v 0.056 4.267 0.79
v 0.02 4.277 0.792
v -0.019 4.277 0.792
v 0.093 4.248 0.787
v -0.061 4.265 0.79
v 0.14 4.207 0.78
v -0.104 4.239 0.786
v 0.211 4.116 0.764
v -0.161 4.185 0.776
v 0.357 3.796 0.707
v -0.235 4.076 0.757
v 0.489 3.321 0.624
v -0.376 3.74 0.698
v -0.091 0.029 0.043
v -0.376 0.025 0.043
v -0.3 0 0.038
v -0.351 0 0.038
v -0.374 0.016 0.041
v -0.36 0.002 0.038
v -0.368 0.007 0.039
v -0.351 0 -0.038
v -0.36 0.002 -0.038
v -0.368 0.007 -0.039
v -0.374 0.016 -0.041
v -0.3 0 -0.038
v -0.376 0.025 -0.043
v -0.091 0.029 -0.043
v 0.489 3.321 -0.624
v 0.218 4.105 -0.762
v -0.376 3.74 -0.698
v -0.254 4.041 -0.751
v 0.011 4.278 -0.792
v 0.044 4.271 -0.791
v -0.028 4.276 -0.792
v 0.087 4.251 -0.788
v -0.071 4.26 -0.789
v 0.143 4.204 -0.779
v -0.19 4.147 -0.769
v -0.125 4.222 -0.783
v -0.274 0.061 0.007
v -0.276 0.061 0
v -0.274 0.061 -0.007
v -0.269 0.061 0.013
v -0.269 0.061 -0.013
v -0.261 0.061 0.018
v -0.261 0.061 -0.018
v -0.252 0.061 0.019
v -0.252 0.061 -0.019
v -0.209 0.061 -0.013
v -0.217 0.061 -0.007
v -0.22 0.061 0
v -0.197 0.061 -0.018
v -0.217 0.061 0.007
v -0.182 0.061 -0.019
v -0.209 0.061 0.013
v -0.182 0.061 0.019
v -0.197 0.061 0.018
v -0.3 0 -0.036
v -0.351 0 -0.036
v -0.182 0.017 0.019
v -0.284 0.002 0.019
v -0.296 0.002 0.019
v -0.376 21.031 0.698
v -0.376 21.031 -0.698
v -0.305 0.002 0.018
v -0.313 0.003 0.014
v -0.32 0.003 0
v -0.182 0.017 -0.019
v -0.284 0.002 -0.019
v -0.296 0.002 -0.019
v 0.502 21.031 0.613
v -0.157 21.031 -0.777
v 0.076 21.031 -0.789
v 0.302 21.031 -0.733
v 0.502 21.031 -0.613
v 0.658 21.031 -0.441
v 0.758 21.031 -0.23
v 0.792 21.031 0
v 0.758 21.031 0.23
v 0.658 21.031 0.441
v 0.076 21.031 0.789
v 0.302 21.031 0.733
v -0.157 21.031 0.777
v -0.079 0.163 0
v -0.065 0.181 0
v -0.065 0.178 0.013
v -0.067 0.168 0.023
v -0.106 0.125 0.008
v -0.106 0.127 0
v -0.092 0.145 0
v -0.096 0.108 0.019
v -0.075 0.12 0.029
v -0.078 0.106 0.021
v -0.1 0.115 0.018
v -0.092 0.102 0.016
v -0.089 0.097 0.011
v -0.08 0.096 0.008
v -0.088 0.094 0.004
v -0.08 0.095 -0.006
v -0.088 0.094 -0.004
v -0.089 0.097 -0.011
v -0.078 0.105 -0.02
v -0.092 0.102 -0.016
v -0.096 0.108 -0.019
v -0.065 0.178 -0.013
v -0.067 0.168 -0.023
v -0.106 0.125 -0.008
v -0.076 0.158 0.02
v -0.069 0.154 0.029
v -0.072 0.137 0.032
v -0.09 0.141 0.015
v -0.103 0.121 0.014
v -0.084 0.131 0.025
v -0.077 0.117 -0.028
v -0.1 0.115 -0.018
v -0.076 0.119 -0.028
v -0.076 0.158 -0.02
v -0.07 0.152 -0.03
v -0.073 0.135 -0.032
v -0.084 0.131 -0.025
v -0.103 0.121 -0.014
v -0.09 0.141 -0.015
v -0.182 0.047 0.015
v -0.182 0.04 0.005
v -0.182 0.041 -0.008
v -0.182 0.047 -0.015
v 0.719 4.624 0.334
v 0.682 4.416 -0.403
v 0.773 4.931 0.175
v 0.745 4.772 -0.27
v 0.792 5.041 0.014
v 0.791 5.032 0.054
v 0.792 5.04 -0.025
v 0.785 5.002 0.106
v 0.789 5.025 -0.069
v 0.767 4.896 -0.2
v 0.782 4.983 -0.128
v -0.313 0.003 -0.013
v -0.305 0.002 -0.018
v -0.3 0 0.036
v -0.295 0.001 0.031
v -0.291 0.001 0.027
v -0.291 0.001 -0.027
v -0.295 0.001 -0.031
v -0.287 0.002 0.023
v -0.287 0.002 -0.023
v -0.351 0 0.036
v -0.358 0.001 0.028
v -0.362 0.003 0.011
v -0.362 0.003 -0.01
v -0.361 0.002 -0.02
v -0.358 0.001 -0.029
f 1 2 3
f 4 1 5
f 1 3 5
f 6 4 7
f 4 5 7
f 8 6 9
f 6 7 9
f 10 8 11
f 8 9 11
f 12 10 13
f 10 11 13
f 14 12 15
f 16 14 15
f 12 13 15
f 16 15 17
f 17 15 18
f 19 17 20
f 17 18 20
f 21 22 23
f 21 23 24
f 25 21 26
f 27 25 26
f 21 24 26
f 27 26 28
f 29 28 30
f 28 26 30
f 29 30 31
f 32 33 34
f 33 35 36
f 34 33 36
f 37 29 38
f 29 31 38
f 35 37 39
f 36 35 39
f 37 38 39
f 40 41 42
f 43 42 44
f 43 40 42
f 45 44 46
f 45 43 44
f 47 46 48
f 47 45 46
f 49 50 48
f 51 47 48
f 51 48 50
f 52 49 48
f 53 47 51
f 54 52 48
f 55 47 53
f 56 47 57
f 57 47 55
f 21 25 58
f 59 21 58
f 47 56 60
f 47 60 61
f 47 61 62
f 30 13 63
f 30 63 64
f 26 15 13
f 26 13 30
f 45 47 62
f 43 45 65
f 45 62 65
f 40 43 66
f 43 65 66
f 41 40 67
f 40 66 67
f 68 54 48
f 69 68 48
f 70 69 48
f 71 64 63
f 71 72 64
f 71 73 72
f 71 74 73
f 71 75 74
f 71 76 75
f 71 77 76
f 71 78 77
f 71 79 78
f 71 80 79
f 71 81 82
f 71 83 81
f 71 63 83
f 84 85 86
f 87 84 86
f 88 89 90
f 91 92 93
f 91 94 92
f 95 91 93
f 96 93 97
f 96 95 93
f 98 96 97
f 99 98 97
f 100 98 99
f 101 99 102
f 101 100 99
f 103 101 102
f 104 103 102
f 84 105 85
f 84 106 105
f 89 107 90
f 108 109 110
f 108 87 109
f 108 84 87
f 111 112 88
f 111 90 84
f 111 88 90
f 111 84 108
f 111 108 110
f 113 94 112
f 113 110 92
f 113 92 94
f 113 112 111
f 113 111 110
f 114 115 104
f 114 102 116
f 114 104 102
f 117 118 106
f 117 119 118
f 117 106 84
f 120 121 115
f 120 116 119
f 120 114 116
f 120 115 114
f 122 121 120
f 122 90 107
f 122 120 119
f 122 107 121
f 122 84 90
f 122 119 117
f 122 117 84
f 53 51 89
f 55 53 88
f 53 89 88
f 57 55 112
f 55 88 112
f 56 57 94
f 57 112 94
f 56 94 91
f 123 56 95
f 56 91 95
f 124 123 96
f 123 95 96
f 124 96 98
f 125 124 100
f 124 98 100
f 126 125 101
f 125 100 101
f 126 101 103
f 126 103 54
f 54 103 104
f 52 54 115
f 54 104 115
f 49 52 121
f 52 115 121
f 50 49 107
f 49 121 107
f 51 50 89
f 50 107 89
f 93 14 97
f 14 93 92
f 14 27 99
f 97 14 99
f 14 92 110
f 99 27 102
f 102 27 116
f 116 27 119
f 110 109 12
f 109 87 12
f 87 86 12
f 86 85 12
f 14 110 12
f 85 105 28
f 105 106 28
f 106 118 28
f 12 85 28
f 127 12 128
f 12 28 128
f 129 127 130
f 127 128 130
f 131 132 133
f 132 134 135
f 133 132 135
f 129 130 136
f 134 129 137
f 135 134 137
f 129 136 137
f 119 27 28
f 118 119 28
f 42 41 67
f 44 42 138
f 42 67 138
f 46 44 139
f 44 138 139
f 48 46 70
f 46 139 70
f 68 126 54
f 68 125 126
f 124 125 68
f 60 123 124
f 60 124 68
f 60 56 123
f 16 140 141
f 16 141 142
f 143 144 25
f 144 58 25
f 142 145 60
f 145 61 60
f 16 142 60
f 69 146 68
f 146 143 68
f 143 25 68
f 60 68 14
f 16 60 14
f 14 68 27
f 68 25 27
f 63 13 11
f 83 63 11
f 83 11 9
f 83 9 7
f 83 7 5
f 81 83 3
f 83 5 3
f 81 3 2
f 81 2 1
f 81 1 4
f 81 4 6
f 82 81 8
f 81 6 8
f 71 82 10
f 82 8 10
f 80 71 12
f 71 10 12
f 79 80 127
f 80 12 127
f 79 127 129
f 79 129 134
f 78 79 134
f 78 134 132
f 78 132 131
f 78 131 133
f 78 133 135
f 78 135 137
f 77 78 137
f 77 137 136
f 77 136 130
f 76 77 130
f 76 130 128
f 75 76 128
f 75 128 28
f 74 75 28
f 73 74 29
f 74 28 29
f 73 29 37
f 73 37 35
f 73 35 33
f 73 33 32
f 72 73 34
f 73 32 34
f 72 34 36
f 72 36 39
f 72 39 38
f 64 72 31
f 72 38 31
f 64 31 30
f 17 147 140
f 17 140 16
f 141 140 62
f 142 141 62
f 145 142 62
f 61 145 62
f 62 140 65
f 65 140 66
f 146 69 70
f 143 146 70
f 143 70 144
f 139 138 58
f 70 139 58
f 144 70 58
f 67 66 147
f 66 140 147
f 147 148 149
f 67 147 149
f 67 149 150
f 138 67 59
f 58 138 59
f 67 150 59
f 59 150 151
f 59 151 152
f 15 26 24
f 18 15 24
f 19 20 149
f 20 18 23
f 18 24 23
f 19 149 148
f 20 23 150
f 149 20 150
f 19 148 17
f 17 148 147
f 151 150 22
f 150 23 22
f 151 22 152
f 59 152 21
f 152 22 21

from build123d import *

# Parameters (mm, degrees)
TD_SKETCH_R                             = 0.79248
TL_FEATURE_DEPTH                        = 21.0312
TDF_STD_SKETCH_W                        = 2.09296
TDF_STD_SKETCH_H                        = 2.09296
TDF_STD_FEATURE_DEPTH                   = 22.061040395
ISA_20_STD_FEATURE_DEPTH                = 22.061040395
ISA_20_STD_FEATURE_DEPTH_BACK           = 22.061040395
F_10BA_STD_FEATURE_DEPTH                = 22.061040395
F_10BA_STD_FEATURE_DEPTH_BACK           = 22.061040395
FRO_STD_FEATURE_DEPTH                   = 22.061040395
FRO_STD_FEATURE_DEPTH_BACK              = 22.061040395
C_STD_FEATURE_DEPTH                     = 22.061040395
C_STD_FEATURE_DEPTH_BACK                = 22.061040395
ERW_STD_FEATURE_DEPTH                   = 0.01905
H_STD_FEATURE_REACH                     = 22.955
H_STD_SKETCH_R                          = 0.01905
H_STD_SKETCH_3_R                        = 0.01905
FUNNEL_FINAL_DIAMETRE_STD_FEATURE_DEPTH = 2.499995
FUNNEL_FINAL_DIAMETRE_STD_FEATURE_DRAFT = -22.5
ROUND_BR_STD_FEATURE_START              = -1
ROUND_BR_STD_FEATURE_DEPTH              = 0.939082249


with BuildPart() as part:
    # TD_sketch → TL_feature (new body)
    with BuildSketch(Plane(origin=(0, 0, 0), x_dir=(1, 0, 0), z_dir=(0, 1, 0))):
        with Locations(Location((0, 0, 0), (0, 0, 270))):
            Circle(TD_SKETCH_R)
    extrude(amount=TL_FEATURE_DEPTH)

    # TDF_STD_sketch → TDF_STD_feature (cut, through all)
    with BuildSketch(Plane(origin=(0, 0, 0), x_dir=(1, 0, 0), z_dir=(0, 1, 0))):
        with Locations((-1.4224, 0)):
            Rectangle(TDF_STD_SKETCH_W, TDF_STD_SKETCH_H)
    extrude(amount=TDF_STD_FEATURE_DEPTH, mode=Mode.SUBTRACT)

    # ISA_20_STD_sketch → ISA_20_STD_feature (cut, two sides: drawn at the far end of the back side and taken through both)
    with BuildSketch(Plane(origin=(0, 0, 0), x_dir=(0, 0, -1), z_dir=(1, 0, 0)).offset(-ISA_20_STD_FEATURE_DEPTH_BACK)):
        Polygon((-12.955177728, 73.256388083), (-3.746467997, 21.0312), (-0.0381, 0), (0.0381, 0), (3.746467997, 21.0312), (12.955177728, 73.256388083), (12.955177728, -32.805303497), (-12.955177728, -32.805303497), align=None)
    extrude(amount=ISA_20_STD_FEATURE_DEPTH + ISA_20_STD_FEATURE_DEPTH_BACK, mode=Mode.SUBTRACT)

    # 10BA_STD_sketch → 10BA_STD_feature (cut, two sides: drawn at the far end of the back side and taken through both)
    with BuildSketch(Plane.XY.offset(-F_10BA_STD_FEATURE_DEPTH_BACK)):
        Polygon((-53.187771959, 0), (-0.37592, 0), (-0.29972, 0), (-0.091356515, 0.029283578), (3.611847997, 21.0312), (12.782529849, 73.04072126), (91.167207296, 2.243763904), (25.196905488, -70.796957355), align=None)
    extrude(amount=F_10BA_STD_FEATURE_DEPTH + F_10BA_STD_FEATURE_DEPTH_BACK, mode=Mode.SUBTRACT)

    # FRO_STD_sketch → FRO_STD_feature (cut, two sides: drawn at the far end of the back side and taken through both)
    with BuildSketch(Plane.XY.offset(-FRO_STD_FEATURE_DEPTH_BACK)):
        with BuildLine():
            Line((-0.37592, 52.149873762), (-0.37592, 0.0254))
            ThreePointArc((-0.37592, 0.0254), (-0.368480512, 0.007439488), (-0.35052, 0))
            Line((-0.35052, 0), (51.773953762, 0))
            Line((51.773953762, 0), (-21.941183964, -73.715137726))
            Line((-21.941183964, -73.715137726), (-74.091057726, -21.565263964))
            Line((-74.091057726, -21.565263964), (-0.37592, 52.149873762))
        make_face()
    extrude(amount=FRO_STD_FEATURE_DEPTH + FRO_STD_FEATURE_DEPTH_BACK, mode=Mode.SUBTRACT)

    # C_STD_sketch → C_STD_feature (cut, two sides: drawn at the far end of the back side and taken through both)
    with BuildSketch(Plane(origin=(0, 0, 0), x_dir=(0, 0, -1), z_dir=(1, 0, 0)).offset(-C_STD_FEATURE_DEPTH_BACK)):
        with BuildLine():
            Line((-51.36762506, -8.882670253), (-0.03551364, 0))
            ThreePointArc((-0.03551364, 0), (0, 0.003050032), (0.03551364, 0))
            Line((0.03551364, 0), (51.36762506, -8.882670253))
            Line((51.36762506, -8.882670253), (51.36762506, -113.072640858))
            Line((51.36762506, -113.072640858), (-51.36762506, -113.072640858))
            Line((-51.36762506, -113.072640858), (-51.36762506, -8.882670253))
        make_face()
    extrude(amount=C_STD_FEATURE_DEPTH + C_STD_FEATURE_DEPTH_BACK, mode=Mode.SUBTRACT)


with BuildPart() as body_2:
    # ERW_STD_sketch → ERW_STD_feature (new, symmetric)
    with BuildSketch(Plane.XY):
        Polygon((-0.182120032, 0.06096), (-0.182120032, 0), (-0.321820032, 0), (-0.275883377, 0.06096), align=None)
    extrude(amount=ERW_STD_FEATURE_DEPTH, both=True)

    # H_STD_sketch → H_STD_feature (add, up to next)
    with BuildSketch(Plane(origin=(-0.096909952, 0.110156063, 0), x_dir=(0, 0, -1), z_dir=(0.8660254037844415, 0.4999999999999953, 0)), mode=Mode.PRIVATE) as h_std_feature_sk1:
        with Locations(Location((0, 0, 0), (0, 0, 90))):
            Circle(H_STD_SKETCH_R)
    h_std_feature_tool1 = extrude(h_std_feature_sk1.sketch, amount=-H_STD_FEATURE_REACH, mode=Mode.PRIVATE) - body_2.part
    add(h_std_feature_tool1.solids().sort_by_distance((-0.09691, 0.110156, 0))[0])


with BuildPart() as funnel_final_diametre_std_feature_tool:
    # H_STD_sketch<3> → funnel_final_diametre_STD_feature (with draft: the straight prism first)
    with BuildSketch(Plane(origin=(-0.096909952, 0.110156063, 0), x_dir=(0, 0, -1), z_dir=(0.8660254037844415, 0.4999999999999953, 0))):
        with Locations(Location((0, 0, 0), (0, 0, 90))):
            Circle(H_STD_SKETCH_3_R)
    extrude(amount=FUNNEL_FINAL_DIAMETRE_STD_FEATURE_DEPTH)
    # funnel_final_diametre_STD_feature: the draft: its side faces are tilted about the plane it starts from
    funnel_final_diametre_std_feature_sides = [funnel_final_diametre_std_feature_tool.faces().sort_by_distance(p)[0] for p in [
        (0.995144638, 0.718657029, 0),
    ]]
    draft(funnel_final_diametre_std_feature_sides, Plane(origin=(-0.096909952, 0.110156063, 0), x_dir=(0, 0, -1), z_dir=(0.8660254037844415, 0.4999999999999953, 0)), FUNNEL_FINAL_DIAMETRE_STD_FEATURE_DRAFT)


with BuildPart() as body_2_1:
    add(body_2.part)

    # funnel_final_diametre_STD_feature: add funnel_final_diametre_std_feature_tool
    add(funnel_final_diametre_std_feature_tool.part)

    # ROUND_BR_STD_feature: read off the stored shape, not the designer's step
    # ROUND_BR_STD_feature outline → ROUND_BR_STD_feature (cut)
    with BuildSketch(Plane(origin=(0, 0, 0), x_dir=(0.79863551004729, -0.601815023152052, 0), z_dir=(0.601815023152052, 0.79863551004729, 0)).offset(ROUND_BR_STD_FEATURE_START)):
        with BuildLine():
            Line((-0.257016905, -0.01905), (-0.237966905, -0.01905))
            ThreePointArc((-0.237966905, -0.01905), (-0.251437289, -0.013470384), (-0.257016905, 0))
            Line((-0.257016905, 0), (-0.257016905, -0.01905))
        make_face()
        with BuildLine():
            Line((-0.257016905, 0.01905), (-0.257016905, 0))
            ThreePointArc((-0.257016905, 0), (-0.251437289, 0.013470384), (-0.237966905, 0.01905))
            Line((-0.237966905, 0.01905), (-0.257016905, 0.01905))
        make_face()
    extrude(amount=ROUND_BR_STD_FEATURE_DEPTH, mode=Mode.SUBTRACT)


with BuildPart() as part_1:
    add(part.part)

    # COMBINE_STD_feature: cut body 2
    add(body_2_1.part, mode=Mode.SUBTRACT)


solid = part_1.part
